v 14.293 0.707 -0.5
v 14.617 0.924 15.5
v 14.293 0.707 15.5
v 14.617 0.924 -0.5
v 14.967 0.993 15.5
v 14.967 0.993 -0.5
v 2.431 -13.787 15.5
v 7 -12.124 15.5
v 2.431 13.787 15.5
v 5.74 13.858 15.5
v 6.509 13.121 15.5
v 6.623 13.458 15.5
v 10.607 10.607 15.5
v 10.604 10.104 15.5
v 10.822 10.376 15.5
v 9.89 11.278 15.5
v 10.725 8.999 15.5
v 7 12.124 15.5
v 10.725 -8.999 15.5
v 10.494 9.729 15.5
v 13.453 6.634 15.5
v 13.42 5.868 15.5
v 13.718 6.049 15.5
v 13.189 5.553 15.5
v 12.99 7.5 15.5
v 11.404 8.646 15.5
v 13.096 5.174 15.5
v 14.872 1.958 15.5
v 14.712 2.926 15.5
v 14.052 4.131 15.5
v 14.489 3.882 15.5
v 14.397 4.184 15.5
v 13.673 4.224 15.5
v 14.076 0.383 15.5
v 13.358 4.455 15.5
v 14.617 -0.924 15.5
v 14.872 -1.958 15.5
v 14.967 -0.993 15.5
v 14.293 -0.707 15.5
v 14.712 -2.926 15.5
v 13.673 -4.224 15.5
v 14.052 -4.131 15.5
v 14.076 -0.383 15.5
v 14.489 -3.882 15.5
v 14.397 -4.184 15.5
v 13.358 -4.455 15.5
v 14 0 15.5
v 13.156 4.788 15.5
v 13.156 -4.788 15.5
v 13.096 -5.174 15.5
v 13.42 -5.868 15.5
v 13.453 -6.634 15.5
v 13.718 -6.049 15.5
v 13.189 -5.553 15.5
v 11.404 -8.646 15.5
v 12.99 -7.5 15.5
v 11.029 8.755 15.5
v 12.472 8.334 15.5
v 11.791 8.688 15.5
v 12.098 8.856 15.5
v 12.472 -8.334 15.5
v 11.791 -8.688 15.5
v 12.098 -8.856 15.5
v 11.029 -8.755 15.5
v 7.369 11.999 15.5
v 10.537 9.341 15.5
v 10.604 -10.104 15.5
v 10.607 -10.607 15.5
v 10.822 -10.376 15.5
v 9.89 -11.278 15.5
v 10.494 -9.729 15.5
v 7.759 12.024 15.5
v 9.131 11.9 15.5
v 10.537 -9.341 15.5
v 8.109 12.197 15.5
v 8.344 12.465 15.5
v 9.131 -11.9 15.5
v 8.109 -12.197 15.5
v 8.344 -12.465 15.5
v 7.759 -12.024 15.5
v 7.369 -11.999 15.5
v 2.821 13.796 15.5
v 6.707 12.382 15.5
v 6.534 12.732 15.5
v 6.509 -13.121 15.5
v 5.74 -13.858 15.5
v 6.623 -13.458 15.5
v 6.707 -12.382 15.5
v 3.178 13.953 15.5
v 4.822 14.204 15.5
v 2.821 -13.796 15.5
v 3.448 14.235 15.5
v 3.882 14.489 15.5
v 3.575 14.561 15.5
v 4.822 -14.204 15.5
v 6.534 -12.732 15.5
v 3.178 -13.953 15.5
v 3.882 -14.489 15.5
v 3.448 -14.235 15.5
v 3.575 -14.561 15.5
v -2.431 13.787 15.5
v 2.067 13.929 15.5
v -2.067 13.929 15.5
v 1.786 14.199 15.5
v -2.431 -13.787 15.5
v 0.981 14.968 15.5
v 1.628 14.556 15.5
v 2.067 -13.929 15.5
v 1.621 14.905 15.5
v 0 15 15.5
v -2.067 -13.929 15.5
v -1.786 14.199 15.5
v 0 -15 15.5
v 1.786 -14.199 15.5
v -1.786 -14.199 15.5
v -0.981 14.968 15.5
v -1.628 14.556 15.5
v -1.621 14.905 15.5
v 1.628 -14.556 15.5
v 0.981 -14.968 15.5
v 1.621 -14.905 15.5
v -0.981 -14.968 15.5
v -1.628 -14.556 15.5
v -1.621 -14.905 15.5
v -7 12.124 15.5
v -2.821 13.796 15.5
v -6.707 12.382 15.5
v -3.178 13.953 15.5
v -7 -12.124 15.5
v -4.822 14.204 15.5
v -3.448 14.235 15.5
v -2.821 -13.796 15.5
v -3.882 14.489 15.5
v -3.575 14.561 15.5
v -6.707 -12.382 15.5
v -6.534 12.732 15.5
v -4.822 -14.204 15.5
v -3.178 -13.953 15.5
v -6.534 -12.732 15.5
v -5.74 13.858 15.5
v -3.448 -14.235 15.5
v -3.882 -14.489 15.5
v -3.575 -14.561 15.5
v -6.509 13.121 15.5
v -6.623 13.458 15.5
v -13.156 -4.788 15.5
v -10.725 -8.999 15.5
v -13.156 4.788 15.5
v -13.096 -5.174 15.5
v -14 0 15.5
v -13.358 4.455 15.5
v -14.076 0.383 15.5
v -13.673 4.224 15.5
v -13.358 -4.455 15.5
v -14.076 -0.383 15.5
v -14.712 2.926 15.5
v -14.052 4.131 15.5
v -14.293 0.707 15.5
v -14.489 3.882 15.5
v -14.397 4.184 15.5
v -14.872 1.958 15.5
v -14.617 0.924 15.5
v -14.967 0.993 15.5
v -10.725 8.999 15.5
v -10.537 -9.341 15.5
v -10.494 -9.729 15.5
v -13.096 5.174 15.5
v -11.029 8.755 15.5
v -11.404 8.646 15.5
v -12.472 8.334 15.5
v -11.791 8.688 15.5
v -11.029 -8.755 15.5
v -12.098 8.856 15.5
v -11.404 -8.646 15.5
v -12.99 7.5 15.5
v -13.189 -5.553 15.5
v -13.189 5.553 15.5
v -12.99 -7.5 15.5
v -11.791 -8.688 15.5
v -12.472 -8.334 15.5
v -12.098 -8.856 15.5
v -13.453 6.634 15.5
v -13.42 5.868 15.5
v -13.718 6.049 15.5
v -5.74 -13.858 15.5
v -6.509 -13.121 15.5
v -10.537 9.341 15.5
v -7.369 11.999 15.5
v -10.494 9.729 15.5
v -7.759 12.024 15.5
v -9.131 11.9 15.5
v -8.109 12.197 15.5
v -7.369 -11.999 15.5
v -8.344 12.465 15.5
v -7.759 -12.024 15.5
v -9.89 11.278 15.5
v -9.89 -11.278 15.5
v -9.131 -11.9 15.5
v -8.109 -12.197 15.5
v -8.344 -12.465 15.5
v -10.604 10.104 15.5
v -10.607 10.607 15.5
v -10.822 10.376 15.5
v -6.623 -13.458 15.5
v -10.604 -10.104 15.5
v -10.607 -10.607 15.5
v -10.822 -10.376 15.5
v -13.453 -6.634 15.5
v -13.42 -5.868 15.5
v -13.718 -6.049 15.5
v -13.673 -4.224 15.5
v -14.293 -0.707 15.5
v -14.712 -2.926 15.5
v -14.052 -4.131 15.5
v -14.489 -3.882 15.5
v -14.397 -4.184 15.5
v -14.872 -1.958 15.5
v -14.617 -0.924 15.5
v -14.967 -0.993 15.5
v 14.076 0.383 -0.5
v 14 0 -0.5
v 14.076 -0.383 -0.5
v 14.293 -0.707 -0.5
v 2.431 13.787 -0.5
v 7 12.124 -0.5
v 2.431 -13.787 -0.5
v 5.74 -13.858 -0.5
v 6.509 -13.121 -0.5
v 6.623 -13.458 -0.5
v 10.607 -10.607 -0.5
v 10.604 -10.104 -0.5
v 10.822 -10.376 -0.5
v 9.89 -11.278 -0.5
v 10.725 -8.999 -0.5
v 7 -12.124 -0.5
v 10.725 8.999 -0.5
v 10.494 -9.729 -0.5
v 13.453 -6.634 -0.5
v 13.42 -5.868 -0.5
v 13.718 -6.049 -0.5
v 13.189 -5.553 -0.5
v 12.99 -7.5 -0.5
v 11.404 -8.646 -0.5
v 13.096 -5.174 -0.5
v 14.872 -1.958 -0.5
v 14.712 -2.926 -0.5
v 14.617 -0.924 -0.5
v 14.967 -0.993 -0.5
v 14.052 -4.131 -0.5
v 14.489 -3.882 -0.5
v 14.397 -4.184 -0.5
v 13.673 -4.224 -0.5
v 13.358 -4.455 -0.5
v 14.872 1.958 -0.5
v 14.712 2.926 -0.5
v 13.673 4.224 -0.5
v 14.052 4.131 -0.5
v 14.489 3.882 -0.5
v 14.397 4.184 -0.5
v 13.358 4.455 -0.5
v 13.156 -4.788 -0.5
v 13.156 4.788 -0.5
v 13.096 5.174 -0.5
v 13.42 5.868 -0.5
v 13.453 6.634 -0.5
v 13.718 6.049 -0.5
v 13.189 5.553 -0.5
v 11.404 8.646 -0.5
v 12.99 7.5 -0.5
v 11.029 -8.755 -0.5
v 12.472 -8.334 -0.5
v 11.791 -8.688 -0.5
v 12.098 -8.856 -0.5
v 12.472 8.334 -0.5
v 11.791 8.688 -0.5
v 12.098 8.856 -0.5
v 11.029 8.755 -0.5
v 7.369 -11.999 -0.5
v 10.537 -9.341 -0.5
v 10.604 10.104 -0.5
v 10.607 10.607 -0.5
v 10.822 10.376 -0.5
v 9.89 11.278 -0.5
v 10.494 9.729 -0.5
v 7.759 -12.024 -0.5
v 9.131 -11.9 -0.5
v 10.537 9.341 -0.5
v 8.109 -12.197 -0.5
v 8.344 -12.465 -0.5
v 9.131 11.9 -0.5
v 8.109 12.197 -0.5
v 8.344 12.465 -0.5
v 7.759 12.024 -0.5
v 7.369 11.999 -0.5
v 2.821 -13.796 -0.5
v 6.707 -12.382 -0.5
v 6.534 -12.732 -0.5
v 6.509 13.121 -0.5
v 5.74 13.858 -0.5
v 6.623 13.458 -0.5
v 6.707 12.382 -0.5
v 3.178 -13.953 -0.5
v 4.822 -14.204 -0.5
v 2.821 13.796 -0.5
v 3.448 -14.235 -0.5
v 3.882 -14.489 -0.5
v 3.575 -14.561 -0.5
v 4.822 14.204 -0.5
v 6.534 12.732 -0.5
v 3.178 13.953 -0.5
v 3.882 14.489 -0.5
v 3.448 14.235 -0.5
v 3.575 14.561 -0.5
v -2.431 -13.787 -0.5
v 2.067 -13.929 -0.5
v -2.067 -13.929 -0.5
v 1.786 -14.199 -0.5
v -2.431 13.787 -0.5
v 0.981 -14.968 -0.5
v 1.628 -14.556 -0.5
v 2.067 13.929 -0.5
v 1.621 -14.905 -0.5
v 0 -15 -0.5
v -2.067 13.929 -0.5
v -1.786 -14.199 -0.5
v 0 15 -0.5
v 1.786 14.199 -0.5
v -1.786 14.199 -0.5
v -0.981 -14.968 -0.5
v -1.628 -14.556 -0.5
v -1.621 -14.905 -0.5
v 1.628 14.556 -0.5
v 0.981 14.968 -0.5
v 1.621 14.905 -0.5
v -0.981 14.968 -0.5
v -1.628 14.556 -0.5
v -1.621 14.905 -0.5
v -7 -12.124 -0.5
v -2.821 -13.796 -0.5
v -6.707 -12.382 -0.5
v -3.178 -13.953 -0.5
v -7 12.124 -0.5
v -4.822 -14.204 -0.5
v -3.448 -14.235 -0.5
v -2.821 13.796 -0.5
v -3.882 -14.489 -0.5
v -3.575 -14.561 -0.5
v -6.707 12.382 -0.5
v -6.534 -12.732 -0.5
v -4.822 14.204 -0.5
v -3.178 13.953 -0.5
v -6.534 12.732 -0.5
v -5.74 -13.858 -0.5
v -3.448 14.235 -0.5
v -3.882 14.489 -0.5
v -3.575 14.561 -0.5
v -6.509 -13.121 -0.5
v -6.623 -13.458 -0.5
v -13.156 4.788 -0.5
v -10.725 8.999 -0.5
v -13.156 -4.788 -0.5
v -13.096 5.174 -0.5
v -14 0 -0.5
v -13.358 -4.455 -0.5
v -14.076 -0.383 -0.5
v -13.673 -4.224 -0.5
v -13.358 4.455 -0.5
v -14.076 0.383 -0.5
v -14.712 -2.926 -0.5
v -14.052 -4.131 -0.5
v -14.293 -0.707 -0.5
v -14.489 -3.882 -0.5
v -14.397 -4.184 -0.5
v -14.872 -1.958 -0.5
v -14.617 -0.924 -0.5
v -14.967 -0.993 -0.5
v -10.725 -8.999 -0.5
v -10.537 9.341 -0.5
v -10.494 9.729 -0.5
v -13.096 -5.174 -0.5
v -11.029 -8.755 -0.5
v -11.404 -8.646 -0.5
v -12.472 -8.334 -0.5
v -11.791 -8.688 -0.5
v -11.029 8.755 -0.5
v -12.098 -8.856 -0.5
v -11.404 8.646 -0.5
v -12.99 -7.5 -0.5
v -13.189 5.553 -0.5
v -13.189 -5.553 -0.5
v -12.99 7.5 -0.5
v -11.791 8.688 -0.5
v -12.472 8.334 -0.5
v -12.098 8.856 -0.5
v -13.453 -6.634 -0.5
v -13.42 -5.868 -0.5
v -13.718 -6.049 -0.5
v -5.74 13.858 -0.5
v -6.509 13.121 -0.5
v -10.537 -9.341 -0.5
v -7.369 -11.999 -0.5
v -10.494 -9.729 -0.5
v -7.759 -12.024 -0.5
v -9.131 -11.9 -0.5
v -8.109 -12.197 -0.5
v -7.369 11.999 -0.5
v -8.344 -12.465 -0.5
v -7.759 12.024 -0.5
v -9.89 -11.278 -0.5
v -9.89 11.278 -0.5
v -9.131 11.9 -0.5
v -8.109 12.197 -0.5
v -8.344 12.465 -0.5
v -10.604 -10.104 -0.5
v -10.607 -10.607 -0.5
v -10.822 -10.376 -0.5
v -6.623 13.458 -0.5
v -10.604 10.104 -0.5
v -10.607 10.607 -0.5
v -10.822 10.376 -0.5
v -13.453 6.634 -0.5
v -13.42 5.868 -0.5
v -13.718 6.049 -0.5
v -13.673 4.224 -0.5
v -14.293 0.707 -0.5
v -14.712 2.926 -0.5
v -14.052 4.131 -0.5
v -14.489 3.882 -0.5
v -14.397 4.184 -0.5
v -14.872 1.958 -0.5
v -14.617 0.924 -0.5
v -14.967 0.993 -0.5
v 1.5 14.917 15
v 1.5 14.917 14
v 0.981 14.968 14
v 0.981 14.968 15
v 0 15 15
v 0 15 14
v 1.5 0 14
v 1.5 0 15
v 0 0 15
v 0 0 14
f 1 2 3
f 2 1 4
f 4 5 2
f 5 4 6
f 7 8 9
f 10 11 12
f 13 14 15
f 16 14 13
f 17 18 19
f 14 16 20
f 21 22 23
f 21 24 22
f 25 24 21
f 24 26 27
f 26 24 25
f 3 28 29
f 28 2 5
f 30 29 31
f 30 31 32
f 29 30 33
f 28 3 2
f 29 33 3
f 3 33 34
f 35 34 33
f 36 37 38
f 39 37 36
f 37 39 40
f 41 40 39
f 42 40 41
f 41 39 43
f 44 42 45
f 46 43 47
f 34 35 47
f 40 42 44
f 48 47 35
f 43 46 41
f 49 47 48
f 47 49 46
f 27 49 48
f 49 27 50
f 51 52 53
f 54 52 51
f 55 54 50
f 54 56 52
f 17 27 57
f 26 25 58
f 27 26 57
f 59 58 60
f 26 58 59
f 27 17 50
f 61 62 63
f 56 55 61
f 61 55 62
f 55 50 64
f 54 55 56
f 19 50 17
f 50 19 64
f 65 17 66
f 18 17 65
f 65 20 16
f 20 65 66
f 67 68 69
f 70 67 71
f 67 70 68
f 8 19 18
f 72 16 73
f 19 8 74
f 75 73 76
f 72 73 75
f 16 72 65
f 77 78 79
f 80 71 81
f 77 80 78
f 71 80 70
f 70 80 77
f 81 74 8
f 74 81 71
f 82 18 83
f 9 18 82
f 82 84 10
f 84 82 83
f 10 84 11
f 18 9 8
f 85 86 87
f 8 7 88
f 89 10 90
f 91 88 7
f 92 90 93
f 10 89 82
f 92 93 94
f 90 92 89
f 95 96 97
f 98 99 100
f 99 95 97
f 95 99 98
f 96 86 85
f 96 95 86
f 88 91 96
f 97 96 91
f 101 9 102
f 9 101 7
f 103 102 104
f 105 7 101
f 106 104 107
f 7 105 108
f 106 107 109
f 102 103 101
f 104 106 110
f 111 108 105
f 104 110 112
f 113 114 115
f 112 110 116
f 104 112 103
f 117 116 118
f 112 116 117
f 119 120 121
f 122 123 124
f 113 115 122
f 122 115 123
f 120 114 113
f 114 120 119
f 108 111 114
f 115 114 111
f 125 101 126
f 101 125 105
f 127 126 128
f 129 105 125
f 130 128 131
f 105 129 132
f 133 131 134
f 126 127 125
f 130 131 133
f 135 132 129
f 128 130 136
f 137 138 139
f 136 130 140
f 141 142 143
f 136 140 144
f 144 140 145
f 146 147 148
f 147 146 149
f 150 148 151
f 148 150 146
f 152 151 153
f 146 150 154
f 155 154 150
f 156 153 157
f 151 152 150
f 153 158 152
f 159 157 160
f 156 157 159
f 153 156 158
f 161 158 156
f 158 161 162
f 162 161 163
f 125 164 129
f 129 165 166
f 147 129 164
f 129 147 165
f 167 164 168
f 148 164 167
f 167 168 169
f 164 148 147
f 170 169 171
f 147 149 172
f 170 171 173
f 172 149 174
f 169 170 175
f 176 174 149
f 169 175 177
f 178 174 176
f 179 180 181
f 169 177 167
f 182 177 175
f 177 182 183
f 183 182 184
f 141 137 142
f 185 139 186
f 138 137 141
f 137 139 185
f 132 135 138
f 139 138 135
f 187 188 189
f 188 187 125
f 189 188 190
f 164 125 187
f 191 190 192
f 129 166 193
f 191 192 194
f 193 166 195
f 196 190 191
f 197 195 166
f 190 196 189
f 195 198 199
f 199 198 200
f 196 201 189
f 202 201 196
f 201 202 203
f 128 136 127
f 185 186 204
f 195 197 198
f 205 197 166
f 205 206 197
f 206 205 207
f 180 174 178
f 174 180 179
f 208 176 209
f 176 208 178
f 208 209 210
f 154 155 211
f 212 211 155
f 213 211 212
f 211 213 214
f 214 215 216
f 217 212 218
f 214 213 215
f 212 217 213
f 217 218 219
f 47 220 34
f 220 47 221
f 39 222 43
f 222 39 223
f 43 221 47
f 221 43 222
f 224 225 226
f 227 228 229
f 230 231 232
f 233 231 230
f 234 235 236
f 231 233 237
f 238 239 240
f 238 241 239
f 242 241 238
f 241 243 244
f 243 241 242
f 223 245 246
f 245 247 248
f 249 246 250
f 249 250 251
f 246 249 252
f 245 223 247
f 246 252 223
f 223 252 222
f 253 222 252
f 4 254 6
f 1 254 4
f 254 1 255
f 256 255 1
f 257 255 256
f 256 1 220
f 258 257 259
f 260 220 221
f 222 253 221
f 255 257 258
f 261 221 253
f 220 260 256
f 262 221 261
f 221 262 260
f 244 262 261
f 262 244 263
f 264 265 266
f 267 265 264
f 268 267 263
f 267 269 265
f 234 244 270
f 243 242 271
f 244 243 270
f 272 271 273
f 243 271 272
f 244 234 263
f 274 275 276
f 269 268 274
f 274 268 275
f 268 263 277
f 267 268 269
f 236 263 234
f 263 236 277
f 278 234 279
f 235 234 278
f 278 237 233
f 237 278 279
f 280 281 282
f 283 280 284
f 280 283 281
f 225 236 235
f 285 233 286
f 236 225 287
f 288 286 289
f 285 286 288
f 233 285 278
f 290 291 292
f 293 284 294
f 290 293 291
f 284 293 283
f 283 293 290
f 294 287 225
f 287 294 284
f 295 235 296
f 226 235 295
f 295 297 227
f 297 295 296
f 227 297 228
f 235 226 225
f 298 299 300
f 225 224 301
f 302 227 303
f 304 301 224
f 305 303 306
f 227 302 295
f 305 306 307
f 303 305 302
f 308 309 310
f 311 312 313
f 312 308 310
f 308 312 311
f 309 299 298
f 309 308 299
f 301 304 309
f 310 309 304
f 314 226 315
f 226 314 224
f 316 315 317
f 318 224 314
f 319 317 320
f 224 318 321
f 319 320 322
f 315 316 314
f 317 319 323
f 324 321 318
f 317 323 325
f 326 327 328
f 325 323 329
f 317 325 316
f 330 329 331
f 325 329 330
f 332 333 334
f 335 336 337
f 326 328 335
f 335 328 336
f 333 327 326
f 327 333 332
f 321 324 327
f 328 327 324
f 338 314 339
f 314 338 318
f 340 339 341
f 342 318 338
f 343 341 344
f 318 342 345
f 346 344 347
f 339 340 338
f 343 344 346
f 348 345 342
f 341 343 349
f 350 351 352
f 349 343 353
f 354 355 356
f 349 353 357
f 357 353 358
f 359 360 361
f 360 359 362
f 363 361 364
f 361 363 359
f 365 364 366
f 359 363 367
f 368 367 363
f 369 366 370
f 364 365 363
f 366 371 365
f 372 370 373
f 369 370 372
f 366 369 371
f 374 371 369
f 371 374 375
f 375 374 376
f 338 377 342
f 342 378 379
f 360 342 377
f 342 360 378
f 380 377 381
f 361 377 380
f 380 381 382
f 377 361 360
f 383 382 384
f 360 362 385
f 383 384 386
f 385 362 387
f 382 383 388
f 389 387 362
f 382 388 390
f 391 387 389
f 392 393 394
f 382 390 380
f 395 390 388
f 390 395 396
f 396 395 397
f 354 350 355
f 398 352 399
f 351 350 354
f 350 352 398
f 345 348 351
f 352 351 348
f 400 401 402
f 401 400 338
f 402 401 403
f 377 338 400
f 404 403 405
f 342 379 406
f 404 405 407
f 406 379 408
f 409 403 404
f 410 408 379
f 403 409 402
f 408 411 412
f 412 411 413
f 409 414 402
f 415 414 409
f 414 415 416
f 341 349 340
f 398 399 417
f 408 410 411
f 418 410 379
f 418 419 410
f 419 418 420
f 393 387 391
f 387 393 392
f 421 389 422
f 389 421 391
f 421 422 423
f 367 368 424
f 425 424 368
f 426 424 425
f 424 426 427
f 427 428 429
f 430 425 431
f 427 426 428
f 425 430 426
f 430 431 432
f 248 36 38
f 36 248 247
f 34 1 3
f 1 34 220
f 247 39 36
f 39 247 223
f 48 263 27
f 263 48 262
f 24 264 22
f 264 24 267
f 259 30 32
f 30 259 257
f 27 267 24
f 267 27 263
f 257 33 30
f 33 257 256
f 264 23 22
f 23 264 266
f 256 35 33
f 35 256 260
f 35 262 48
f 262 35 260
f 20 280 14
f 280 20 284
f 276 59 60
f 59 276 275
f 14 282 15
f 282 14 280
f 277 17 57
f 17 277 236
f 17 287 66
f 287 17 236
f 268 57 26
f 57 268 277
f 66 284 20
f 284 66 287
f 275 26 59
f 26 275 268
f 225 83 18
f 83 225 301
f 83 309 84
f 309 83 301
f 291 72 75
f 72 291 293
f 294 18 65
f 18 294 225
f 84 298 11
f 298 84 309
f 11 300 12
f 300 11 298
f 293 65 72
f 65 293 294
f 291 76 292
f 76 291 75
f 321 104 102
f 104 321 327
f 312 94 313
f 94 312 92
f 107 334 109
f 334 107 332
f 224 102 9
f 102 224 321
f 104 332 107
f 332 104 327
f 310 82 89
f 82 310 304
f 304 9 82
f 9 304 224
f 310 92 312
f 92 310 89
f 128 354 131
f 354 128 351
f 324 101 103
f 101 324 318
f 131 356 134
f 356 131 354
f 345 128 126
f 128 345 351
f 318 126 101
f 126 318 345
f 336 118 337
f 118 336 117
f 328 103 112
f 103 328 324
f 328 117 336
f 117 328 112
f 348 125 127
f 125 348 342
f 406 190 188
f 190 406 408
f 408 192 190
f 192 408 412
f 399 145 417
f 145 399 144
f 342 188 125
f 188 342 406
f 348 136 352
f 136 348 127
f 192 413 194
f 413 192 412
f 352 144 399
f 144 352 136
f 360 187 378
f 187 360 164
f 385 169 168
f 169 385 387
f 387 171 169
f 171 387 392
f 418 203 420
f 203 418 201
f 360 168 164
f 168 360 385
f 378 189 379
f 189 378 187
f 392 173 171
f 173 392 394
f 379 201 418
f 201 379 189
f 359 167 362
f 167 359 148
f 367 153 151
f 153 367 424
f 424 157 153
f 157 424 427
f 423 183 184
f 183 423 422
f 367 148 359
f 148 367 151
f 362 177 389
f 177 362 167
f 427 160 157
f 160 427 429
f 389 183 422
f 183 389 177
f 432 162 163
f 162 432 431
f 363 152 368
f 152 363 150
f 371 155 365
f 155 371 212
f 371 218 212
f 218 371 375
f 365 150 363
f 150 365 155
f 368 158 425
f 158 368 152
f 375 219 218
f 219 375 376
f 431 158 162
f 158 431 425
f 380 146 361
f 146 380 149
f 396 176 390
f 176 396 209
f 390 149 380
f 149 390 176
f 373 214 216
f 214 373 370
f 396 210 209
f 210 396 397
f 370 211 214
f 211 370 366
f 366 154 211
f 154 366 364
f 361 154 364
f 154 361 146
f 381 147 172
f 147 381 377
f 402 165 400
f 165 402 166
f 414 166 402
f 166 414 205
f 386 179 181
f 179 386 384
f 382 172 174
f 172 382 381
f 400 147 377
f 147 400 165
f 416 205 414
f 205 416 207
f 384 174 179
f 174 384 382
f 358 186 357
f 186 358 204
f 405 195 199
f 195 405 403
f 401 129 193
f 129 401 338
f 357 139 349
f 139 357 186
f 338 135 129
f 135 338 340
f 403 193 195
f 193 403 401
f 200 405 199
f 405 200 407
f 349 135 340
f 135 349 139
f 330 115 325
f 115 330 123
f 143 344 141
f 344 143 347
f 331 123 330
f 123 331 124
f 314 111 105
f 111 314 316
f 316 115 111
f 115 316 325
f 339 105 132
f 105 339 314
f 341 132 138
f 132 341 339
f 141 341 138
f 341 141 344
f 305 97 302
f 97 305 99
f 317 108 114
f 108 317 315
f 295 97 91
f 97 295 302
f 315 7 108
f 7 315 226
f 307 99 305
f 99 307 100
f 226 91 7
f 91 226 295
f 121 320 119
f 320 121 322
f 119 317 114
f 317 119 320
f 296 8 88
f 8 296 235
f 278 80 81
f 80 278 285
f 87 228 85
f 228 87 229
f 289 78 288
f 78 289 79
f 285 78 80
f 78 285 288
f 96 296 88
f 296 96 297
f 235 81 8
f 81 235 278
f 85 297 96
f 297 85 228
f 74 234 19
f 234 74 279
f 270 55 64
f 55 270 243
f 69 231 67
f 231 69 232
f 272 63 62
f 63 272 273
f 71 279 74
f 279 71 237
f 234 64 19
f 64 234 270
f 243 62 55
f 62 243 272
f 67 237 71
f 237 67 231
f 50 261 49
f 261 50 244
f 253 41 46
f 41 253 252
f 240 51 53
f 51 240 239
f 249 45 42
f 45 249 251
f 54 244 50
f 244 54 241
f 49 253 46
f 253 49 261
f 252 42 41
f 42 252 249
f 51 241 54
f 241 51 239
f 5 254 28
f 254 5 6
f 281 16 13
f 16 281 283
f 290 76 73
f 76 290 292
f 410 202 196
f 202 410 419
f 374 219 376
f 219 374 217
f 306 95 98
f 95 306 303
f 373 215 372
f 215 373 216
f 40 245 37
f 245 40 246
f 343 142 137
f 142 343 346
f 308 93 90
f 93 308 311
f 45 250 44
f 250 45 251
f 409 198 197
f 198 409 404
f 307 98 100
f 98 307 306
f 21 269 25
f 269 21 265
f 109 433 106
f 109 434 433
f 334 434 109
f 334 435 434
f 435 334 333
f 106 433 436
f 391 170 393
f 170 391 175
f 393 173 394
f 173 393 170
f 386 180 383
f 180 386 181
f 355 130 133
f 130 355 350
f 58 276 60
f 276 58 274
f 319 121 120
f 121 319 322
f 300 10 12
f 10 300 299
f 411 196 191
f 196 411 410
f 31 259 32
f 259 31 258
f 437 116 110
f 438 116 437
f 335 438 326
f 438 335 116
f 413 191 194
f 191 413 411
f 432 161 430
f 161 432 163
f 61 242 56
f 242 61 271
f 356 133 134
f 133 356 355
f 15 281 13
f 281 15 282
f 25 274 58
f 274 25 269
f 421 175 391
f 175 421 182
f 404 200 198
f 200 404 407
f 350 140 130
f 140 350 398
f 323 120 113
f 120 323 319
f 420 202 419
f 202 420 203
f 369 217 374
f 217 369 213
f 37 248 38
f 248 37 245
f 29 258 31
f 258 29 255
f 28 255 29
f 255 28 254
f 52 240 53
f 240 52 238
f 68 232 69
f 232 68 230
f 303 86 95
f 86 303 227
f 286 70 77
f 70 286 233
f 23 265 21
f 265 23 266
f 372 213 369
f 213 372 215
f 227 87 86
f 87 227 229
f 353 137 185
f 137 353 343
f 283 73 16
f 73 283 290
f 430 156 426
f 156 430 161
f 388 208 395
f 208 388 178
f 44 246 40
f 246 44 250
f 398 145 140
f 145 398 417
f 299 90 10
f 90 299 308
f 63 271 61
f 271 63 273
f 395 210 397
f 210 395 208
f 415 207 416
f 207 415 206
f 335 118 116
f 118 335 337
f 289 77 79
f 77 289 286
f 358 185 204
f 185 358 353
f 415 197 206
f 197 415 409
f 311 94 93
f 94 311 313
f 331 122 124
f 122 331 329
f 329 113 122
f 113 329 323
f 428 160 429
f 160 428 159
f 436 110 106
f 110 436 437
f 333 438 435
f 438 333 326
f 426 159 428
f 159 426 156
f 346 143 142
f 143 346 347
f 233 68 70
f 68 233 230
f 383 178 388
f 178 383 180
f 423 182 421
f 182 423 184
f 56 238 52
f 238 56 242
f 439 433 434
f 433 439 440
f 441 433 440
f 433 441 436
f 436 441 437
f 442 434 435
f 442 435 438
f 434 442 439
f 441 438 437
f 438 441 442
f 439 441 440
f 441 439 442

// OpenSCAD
// Replacement knob for a hotplate stirrer with a 6 mm D-shaft
// Print orientation: bottom face (facing the hotplate) on the bed at z = 0

// ---------------- Parameters ----------------
knob_d      = 30;    // knob outer diameter (mm)
knob_h      = 15;    // knob height (mm)

bore_depth  = 12;    // D-bore depth from bottom face (mm)
bore_flat   = 1.5;   // D-bore flat width (mm); circle diameter - flat = 4.7
bore_angle  = 90;    // D-bore symmetry plane angle (deg)

grooves     = 18;    // number of vertical grip grooves
groove_d    = 2;     // groove diameter (mm)

pointer_w   = 1.5;   // pointer groove width (mm)
pointer_d   = 1;     // pointer groove depth (mm)

eps         = 0.5;   // overcut for clean boolean differences (mm)

$fn = 96;            // facet count for round features

// ---------------- Model ----------------
difference() {
    // Main body: cylinder, centred on origin, resting on z = 0
    translate([0, 0, -eps])
        cylinder(d = knob_d, h = knob_h + 2 * eps);

    // D-shaped blind bore from bottom face, extends past top face
    translate([0, 0, -eps])
        rotate([0, 0, bore_angle])
            linear_extrude(height = bore_depth + 2 * eps)
                polygon([
                    [-(bore_flat / 2 + eps), -(bore_flat / 2 + eps)],
                    [-(bore_flat / 2 + eps), (bore_flat / 2 + eps)],
                    [(bore_d() - bore_flat) / 2 + eps, 0],
                    [-(bore_d() - bore_flat) / 2 - eps, 0]
                ]);

    // 18 evenly spaced vertical grip grooves along the full height
    for (i = [0 : grooves - 1])
        rotate([0, 0, i * 360 / grooves])
            translate([knob_d / 2, 0, -eps])
                cylinder(d = groove_d, h = knob_h + 2 * eps, $fn = 16);

    // Pointer groove on top face, from centre to outer edge, on flat side
    translate([-(bore_flat / 2 - pointer_w / 2), 0, knob_h - pointer_d])
        cube([pointer_w, knob_d / 2, pointer_d]);
}

// Helper: D-bore circle diameter (6.2 mm per spec)
function bore_d() = 6.2;
